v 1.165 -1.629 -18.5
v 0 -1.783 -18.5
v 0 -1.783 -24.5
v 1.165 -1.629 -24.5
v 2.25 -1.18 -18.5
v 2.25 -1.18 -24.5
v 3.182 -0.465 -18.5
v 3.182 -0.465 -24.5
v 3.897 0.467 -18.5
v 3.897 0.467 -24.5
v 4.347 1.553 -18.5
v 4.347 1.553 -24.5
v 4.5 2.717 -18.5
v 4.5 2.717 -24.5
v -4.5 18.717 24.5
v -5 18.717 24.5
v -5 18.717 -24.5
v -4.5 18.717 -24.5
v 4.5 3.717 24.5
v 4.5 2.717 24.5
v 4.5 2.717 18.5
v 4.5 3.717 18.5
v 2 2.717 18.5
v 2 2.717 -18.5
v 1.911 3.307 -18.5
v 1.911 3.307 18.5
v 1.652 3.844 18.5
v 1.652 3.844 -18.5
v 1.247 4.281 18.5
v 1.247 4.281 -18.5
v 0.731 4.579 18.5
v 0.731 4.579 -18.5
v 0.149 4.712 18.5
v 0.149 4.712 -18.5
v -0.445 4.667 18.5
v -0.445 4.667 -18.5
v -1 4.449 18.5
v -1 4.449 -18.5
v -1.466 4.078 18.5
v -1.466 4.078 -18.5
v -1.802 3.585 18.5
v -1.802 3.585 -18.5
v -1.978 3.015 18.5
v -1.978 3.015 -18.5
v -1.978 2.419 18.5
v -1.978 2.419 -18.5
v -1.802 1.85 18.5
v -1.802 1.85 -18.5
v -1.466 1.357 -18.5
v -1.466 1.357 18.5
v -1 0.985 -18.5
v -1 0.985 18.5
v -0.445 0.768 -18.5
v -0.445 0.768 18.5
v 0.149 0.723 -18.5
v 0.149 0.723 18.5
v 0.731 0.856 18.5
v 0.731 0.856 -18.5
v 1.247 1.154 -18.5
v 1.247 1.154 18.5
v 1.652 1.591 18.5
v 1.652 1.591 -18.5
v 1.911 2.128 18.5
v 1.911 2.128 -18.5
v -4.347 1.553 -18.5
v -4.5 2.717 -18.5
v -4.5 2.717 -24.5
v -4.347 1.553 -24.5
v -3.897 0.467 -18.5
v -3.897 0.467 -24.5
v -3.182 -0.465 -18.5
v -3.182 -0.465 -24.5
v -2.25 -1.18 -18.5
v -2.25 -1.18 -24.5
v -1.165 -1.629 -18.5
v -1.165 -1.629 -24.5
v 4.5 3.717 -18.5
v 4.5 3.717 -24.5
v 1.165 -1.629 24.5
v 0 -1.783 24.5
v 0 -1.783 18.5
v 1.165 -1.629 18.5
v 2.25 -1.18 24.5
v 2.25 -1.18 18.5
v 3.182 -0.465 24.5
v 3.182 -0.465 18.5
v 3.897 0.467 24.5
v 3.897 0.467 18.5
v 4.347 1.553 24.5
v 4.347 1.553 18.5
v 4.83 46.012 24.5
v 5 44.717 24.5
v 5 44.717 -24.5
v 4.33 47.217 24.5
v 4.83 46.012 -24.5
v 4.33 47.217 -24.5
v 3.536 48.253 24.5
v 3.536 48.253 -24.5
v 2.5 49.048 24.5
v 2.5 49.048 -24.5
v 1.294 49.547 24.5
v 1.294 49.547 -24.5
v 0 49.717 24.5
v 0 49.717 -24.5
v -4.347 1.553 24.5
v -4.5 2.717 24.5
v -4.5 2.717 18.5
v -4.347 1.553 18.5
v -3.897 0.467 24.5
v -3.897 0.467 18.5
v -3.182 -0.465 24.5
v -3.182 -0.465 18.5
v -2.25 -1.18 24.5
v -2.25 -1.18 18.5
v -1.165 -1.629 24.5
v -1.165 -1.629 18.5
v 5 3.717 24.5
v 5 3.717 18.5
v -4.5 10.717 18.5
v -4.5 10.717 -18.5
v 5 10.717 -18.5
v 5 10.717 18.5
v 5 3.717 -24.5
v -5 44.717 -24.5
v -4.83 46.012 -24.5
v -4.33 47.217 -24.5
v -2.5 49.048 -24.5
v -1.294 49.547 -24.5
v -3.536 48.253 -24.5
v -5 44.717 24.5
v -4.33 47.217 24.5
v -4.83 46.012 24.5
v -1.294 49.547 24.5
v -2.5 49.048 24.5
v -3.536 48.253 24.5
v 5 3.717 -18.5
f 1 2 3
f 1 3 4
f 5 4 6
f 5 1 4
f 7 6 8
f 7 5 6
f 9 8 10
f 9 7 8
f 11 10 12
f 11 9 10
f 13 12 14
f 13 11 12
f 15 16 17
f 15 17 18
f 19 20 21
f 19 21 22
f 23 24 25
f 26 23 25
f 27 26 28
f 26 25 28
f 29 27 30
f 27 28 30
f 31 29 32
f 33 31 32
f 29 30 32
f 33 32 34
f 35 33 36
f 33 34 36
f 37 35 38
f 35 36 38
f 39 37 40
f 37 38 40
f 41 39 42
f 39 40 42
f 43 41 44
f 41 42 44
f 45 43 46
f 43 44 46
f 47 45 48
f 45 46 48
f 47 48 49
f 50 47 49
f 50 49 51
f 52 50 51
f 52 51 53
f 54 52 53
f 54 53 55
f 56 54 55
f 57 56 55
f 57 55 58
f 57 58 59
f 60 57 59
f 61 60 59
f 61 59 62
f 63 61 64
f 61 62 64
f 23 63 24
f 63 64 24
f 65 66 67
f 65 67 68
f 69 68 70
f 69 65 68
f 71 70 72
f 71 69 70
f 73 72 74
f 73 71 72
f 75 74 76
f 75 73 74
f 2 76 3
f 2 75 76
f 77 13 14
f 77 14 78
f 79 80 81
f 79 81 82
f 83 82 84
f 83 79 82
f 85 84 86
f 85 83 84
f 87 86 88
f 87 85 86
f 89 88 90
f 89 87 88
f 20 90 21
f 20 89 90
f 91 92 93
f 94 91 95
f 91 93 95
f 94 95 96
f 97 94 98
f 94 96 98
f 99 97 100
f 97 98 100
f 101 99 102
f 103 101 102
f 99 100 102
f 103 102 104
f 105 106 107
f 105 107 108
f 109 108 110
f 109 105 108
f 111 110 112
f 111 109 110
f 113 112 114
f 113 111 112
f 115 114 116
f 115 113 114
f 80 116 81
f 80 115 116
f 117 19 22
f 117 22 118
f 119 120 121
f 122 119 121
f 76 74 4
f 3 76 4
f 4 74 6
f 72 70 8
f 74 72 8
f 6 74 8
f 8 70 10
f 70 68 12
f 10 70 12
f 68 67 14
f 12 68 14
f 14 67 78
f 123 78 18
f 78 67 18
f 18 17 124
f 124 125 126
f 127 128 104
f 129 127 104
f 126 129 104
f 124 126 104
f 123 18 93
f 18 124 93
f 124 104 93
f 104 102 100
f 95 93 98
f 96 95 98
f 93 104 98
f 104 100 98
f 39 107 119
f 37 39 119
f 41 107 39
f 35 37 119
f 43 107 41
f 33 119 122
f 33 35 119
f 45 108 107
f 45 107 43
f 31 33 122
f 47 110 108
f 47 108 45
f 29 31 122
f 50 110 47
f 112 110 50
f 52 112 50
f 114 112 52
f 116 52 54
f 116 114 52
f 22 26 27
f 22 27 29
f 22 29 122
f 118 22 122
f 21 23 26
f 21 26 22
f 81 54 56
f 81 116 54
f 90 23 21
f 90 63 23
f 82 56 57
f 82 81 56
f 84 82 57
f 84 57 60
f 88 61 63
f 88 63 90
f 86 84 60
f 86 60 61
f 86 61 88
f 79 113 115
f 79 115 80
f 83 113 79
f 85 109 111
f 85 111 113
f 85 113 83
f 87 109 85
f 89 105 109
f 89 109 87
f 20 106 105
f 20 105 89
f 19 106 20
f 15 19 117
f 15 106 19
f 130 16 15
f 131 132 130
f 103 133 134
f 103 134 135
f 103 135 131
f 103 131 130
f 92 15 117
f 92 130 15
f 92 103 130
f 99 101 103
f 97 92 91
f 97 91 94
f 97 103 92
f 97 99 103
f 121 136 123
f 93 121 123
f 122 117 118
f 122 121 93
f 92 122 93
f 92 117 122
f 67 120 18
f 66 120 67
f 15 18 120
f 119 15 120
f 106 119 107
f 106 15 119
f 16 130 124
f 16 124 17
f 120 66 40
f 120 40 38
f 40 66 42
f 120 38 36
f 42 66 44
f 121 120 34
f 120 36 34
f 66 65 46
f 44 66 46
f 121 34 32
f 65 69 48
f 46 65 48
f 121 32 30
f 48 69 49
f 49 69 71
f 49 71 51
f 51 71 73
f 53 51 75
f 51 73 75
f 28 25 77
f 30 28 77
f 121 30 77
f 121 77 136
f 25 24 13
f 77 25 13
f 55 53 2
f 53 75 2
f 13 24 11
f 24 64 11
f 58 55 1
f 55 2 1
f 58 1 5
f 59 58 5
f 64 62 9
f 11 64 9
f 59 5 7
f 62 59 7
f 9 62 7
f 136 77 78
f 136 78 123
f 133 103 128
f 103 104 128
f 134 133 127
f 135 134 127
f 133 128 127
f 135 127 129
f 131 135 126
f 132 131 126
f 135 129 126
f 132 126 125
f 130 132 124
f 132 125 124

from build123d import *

# Parameters (mm, degrees)
BOSS_EXTRUDE1_DEPTH    = 49
FILLET1_R              = 5
CUT_EXTRUDE1_START     = -2.282608696
CUT_EXTRUDE1_OUTLINE_W = 10
CUT_EXTRUDE1_OUTLINE_H = 37
CUT_EXTRUDE1_DEPTH     = 13
SKETCH6_R              = 2
BOSS_EXTRUDE2_DEPTH    = 37
CUT_EXTRUDE2_DEPTH     = 49


# Read off the part's stored shape, not the designer's step: Cut-Extrude1
with BuildPart() as part:
    # Sketch3 → Boss-Extrude1 (new body)
    with BuildSketch(Plane.XY.offset(24.5)):
        Polygon((-5, -2.282608696), (0, -2.282608696), (5, -2.282608696), (5, 49.717391304), (-5, 49.717391304), align=None)
    extrude(amount=-BOSS_EXTRUDE1_DEPTH)

    # Fillet1
    fillet1_edges = [part.edges().sort_by_distance(p)[0] for p in [
        (5, -2.282608696, 0),
        (-5, -2.282608696, 0),
        (5, 49.717391304, 0),
        (-5, 49.717391304, 0),
    ]]
    fillet(fillet1_edges, radius=FILLET1_R - 0.0001)  # a hair under: the kernel refuses the full size

    # Cut-Extrude1 outline → Cut-Extrude1 (cut)
    with BuildSketch(Plane(origin=(0, 0, 0), x_dir=(1, 0, 0), z_dir=(0, 1, 0)).offset(CUT_EXTRUDE1_START)):
        Rectangle(CUT_EXTRUDE1_OUTLINE_W, CUT_EXTRUDE1_OUTLINE_H)
    extrude(amount=CUT_EXTRUDE1_DEPTH, mode=Mode.SUBTRACT)

    # Sketch6 → Boss-Extrude2 (add)
    with BuildSketch(Plane.XY.offset(-18.5)):
        with Locations((0, 2.717391304)):
            Circle(SKETCH6_R)
    extrude(amount=BOSS_EXTRUDE2_DEPTH)

    # Sketch7 → Cut-Extrude2 (cut)
    with BuildSketch(Plane.XY.offset(24.5)):
        with BuildLine():
            Line((4.5, 3.717391304), (5, 3.717391304))
            Line((5, 3.717391304), (5, 2.717391304))
            ThreePointArc((5, 2.717391304), (3.535533906, -0.818142602), (0, -2.282608696))
            ThreePointArc((0, -2.282608696), (-3.535533906, -0.818142602), (-5, 2.717391304))
            Line((-5, 2.717391304), (-5, 18.717391304))
            Line((-5, 18.717391304), (-4.5, 18.717391304))
            Line((-4.5, 18.717391304), (-4.5, 2.717391304))
            ThreePointArc((-4.5, 2.717391304), (-3.181980515, -0.464589211), (0, -1.782608696))
            ThreePointArc((0, -1.782608696), (3.181980515, -0.464589211), (4.5, 2.717391304))
            Line((4.5, 2.717391304), (4.5, 3.717391304))
        make_face()
    extrude(amount=-CUT_EXTRUDE2_DEPTH, mode=Mode.SUBTRACT)


with BuildPart() as cut_extrude2_kept_piece:
    # of the separate pieces the step leaves, the one the design keeps (cut_extrude2_pieces_kept)
    add(part.part.solids().sort_by_distance((4.5, 3.717391304, -18.5))[0])


solid = cut_extrude2_kept_piece.part
